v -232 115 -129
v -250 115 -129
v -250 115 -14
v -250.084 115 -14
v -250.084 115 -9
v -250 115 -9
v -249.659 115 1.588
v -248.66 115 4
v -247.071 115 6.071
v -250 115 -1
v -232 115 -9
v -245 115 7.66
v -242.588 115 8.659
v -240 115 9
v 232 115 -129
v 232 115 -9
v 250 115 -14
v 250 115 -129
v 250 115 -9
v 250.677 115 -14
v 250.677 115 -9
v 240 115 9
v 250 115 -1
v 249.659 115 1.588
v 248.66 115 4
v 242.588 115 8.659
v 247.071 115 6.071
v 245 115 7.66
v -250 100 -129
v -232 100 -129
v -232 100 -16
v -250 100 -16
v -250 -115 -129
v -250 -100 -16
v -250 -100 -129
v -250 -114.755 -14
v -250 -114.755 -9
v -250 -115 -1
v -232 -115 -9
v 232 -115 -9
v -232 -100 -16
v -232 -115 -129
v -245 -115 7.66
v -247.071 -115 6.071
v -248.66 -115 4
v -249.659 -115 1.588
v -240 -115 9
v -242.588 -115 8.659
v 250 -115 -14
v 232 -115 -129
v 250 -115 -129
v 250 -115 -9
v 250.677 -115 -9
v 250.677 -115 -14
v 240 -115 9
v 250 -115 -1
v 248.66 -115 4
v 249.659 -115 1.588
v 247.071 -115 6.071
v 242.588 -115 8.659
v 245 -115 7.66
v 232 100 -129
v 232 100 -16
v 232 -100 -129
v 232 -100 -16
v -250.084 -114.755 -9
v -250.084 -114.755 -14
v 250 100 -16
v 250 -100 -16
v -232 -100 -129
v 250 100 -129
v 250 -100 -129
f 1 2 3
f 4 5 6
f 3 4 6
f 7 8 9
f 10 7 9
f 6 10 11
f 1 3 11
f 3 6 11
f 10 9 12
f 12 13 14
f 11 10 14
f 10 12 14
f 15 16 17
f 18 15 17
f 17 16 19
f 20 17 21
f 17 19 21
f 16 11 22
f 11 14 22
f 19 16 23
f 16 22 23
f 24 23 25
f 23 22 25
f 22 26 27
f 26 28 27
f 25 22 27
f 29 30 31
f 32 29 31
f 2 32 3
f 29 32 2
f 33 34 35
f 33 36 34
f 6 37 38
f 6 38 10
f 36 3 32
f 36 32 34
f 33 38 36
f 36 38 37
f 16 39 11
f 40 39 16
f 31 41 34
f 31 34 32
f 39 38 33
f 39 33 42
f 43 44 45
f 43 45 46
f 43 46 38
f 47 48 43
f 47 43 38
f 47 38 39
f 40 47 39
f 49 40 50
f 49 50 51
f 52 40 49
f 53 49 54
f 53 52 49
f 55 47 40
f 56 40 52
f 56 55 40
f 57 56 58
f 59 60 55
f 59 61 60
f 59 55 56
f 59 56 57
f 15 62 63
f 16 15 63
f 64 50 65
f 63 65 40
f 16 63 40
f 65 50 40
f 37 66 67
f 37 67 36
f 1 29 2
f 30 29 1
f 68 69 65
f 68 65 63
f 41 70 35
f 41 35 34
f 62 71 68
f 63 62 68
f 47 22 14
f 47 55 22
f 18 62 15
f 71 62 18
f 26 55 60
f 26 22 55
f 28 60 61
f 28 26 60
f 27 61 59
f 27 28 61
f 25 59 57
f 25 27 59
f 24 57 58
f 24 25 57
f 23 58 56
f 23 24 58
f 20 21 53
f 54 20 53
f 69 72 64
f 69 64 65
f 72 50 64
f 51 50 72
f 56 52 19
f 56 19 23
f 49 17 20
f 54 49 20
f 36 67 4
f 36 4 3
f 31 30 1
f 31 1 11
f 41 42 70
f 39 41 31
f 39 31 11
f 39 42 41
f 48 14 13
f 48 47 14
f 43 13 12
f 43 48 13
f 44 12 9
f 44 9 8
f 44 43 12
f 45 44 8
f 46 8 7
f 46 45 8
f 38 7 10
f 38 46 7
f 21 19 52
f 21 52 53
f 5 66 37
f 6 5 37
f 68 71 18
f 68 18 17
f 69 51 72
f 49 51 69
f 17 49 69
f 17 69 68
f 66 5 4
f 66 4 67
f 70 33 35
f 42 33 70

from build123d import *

# Parameters (mm, degrees)
F0_W     = 18
F0_H     = 120
F1_DEPTH = 115
F2_R     = 10
F3_W     = 200
F3_H     = 113
F4_DEPTH = 500.001
F5_W     = 18.0844597816
F5_H     = 229.7550716996
F5_W_2   = 18.6774961948
F5_H_2   = 230
F6_DEPTH = 5


with BuildPart() as f1:
    # F0 (on Front) → F1 (new body, symmetric)
    with BuildSketch(Plane.XZ):
        Polygon((250, 9), (-250, 9), (-250, -9), (-232, -9), (232, -9), (250, -9), align=None)
        with Locations((-241, -69)):
            Rectangle(F0_W, F0_H)
        with Locations((241, -69)):
            Rectangle(F0_W, F0_H)
    extrude(amount=F1_DEPTH, both=True)

    # F2
    f2_edges = [f1.edges().sort_by_distance(p)[0] for p in [
        (-250, 0, 9),
        (250, 0, 9),
    ]]
    fillet(f2_edges, radius=F2_R)

    # F3 (on face) → F4 (cut, through all)
    with BuildSketch(Plane.YZ.offset(250)):
        with Locations((0, -72.5)):
            Rectangle(F3_W, F3_H)
    extrude(amount=-F4_DEPTH, mode=Mode.SUBTRACT)

    # F5 (on face) → F6 (join)
    with BuildSketch(Plane(origin=(0, 0, -9), x_dir=(1, 0, 0), z_dir=(0, 0, -1))):
        with Locations((-241.0422298908, -0.1224641502)):
            Rectangle(F5_W, F5_H)
        with Locations((241.3387480974, 0)):
            Rectangle(F5_W_2, F5_H_2)
    extrude(amount=F6_DEPTH)


solid = f1.part
